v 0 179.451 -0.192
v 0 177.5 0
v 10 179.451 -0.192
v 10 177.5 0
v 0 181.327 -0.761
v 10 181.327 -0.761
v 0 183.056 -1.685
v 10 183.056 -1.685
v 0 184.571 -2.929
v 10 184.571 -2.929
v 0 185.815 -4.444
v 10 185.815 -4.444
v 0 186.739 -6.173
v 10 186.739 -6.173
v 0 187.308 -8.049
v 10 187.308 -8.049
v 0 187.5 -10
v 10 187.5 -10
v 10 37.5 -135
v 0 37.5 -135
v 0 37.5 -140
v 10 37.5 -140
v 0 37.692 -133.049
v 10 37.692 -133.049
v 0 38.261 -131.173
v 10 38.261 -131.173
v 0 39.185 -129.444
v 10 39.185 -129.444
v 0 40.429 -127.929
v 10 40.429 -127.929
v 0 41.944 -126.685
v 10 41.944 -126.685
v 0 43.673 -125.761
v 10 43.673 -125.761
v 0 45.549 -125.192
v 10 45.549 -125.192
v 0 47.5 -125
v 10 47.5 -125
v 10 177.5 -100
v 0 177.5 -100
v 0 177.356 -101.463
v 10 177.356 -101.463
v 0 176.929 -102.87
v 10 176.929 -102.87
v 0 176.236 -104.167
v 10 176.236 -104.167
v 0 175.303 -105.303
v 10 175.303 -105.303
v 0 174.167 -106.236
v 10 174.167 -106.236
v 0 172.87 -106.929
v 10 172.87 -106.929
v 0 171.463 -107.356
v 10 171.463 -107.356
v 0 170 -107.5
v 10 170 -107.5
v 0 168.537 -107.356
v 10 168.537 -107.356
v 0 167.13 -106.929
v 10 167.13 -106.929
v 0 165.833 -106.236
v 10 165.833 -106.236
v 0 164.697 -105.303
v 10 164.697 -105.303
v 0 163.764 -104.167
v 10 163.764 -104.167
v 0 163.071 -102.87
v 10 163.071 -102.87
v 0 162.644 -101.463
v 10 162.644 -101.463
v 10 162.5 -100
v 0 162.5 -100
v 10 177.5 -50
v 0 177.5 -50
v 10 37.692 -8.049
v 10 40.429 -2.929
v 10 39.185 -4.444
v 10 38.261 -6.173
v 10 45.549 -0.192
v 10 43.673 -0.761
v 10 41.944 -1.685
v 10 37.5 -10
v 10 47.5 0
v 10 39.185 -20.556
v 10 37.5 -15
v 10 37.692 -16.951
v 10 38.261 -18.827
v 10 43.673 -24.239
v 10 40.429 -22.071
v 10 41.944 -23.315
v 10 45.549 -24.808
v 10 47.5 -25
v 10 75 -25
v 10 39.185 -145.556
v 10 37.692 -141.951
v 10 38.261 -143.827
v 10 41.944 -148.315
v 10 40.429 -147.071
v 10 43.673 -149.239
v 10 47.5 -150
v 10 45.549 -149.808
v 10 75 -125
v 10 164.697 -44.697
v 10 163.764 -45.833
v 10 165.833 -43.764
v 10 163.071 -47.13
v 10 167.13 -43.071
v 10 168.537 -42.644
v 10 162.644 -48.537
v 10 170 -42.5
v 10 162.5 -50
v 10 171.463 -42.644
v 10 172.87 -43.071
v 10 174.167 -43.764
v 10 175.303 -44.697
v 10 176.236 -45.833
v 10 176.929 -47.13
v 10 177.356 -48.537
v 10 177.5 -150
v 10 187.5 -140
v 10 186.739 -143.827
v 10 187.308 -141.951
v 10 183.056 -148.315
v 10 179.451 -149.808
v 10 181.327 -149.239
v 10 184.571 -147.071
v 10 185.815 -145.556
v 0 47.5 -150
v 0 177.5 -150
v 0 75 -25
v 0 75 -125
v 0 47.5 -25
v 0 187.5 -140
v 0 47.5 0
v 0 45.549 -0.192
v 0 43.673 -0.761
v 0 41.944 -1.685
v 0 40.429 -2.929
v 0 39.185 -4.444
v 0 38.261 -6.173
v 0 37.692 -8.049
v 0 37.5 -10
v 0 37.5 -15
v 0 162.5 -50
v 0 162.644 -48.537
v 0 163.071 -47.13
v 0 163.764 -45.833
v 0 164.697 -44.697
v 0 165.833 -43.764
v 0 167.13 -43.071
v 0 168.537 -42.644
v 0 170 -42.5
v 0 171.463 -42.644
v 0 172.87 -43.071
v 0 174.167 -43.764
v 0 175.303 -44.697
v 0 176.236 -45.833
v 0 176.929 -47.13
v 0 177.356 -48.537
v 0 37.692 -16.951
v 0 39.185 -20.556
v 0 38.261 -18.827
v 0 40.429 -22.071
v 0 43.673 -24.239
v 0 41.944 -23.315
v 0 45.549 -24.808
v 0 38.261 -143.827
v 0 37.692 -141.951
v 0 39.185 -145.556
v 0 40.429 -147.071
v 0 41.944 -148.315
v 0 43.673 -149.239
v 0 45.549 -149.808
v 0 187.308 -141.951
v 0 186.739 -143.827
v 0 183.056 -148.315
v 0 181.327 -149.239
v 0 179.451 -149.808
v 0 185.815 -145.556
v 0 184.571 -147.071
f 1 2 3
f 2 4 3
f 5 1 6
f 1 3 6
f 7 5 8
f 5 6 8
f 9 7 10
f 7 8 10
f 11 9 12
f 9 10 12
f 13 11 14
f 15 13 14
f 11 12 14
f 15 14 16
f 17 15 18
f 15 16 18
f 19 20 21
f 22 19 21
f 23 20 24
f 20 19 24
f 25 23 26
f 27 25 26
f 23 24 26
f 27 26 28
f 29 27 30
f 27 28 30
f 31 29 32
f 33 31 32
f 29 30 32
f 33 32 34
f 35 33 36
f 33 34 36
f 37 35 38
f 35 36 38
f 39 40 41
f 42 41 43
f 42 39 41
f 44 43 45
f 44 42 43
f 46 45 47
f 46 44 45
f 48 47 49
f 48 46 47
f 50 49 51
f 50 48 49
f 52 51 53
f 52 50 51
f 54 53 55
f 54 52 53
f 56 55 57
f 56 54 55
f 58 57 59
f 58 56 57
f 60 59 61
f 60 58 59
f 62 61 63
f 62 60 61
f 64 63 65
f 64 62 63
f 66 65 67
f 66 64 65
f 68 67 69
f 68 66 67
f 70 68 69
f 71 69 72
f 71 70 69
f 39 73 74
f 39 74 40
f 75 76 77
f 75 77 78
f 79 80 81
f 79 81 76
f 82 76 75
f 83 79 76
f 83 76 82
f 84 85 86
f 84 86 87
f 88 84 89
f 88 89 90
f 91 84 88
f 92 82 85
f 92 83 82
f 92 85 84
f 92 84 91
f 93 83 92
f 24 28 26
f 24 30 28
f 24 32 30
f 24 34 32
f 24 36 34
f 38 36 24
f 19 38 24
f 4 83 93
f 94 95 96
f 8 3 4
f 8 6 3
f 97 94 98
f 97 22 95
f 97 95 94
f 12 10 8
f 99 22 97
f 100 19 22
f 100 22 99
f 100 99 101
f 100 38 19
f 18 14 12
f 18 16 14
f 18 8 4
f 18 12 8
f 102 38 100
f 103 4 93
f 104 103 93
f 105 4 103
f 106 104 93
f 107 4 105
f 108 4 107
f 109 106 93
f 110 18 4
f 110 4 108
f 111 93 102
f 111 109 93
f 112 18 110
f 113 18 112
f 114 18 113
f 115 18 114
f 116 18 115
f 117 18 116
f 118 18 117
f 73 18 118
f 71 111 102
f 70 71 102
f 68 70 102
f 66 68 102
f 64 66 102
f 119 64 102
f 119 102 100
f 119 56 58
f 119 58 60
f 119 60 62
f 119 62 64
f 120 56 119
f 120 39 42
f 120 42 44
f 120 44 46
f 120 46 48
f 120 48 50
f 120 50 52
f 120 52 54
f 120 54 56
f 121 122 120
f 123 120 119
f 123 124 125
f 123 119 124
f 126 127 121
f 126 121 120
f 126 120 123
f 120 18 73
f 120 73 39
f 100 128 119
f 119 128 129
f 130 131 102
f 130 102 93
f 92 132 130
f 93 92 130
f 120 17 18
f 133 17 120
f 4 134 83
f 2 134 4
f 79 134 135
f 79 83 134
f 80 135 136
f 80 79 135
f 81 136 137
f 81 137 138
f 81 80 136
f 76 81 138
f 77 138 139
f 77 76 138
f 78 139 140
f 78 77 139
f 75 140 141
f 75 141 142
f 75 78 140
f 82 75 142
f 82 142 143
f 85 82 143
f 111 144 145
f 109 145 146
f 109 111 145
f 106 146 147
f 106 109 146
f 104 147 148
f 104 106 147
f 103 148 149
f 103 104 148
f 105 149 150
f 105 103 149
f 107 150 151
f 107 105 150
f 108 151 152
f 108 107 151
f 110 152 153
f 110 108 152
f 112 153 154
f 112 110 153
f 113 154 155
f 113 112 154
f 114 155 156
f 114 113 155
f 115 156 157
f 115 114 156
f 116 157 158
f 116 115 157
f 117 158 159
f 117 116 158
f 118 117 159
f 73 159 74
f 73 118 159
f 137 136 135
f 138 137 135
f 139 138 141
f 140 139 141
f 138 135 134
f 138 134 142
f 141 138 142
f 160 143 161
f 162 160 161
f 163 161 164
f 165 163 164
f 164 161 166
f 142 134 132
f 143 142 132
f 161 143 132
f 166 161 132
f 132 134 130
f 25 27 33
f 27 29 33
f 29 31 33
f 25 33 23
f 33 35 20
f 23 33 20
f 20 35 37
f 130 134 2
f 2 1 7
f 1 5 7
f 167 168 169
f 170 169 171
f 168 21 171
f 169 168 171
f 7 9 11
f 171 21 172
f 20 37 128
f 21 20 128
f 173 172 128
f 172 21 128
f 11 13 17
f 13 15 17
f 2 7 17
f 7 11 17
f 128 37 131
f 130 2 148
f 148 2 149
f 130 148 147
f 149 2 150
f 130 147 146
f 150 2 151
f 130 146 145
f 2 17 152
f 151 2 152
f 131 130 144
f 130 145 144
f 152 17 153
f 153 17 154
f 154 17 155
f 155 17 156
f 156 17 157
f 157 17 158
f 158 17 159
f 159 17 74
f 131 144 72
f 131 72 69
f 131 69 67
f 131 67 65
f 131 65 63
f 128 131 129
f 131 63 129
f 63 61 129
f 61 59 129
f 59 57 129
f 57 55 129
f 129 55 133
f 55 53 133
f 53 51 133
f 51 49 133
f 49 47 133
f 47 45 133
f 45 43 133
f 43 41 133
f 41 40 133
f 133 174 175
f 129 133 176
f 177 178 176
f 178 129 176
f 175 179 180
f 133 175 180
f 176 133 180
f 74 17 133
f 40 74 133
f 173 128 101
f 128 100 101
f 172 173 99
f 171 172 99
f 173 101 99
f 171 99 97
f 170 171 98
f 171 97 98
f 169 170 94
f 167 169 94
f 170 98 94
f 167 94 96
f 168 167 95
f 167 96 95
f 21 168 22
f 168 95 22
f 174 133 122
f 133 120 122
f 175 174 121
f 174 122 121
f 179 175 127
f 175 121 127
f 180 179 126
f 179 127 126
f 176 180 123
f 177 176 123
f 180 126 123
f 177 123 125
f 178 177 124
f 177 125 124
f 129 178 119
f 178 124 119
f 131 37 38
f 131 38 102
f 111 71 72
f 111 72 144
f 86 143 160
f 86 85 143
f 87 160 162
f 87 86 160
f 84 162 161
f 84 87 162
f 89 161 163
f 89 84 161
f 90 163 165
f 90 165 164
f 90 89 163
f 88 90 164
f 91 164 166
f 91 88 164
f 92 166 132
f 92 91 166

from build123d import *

# Parameters (mm, degrees)
SKETCH10_W          = 150
SKETCH10_H          = 150
BOSS_EXTRUDE3_DEPTH = 10
SKETCH12_W          = 100
SKETCH12_H          = 37.5
CUT_EXTRUDE2_DEPTH  = 10
FILLET7_R           = 10
CUT_EXTRUDE3_DEPTH  = 35


with BuildPart() as part:
    # Sketch10 → Boss-Extrude3 (new body)
    with BuildSketch(Plane(origin=(0, 0, 0), x_dir=(0, 0, -1), z_dir=(1, 0, 0))):
        with Locations((75, 112.5)):
            Rectangle(SKETCH10_W, SKETCH10_H)
    extrude(amount=BOSS_EXTRUDE3_DEPTH)

    # Sketch12 → Cut-Extrude2 (cut)
    with BuildSketch(Plane.ZY):
        with Locations((-75, 56.25)):
            Rectangle(SKETCH12_W, SKETCH12_H)
    extrude(amount=-CUT_EXTRUDE2_DEPTH, mode=Mode.SUBTRACT)

    # Fillet7
    fillet7_edges = [part.edges().sort_by_distance(p)[0] for p in [
        (5, 37.5, -125),
        (5, 37.5, -25),
        (5, 187.5, 0),
        (5, 187.5, -150),
        (5, 37.5, -150),
        (5, 37.5, 0),
    ]]
    fillet(fillet7_edges, radius=FILLET7_R)

    # Sketch13 → Cut-Extrude3 (cut)
    with BuildSketch(Plane(origin=(10, 0, 0), x_dir=(0, 0, -1), z_dir=(1, 0, 0))):
        with BuildLine():
            Line((50, 177.5), (100, 177.5))
            ThreePointArc((100, 177.5), (107.5, 170), (100, 162.5))
            Line((100, 162.5), (50, 162.5))
            ThreePointArc((50, 162.5), (42.5, 170), (50, 177.5))
        make_face()
    extrude(amount=-CUT_EXTRUDE3_DEPTH, mode=Mode.SUBTRACT)


solid = part.part
